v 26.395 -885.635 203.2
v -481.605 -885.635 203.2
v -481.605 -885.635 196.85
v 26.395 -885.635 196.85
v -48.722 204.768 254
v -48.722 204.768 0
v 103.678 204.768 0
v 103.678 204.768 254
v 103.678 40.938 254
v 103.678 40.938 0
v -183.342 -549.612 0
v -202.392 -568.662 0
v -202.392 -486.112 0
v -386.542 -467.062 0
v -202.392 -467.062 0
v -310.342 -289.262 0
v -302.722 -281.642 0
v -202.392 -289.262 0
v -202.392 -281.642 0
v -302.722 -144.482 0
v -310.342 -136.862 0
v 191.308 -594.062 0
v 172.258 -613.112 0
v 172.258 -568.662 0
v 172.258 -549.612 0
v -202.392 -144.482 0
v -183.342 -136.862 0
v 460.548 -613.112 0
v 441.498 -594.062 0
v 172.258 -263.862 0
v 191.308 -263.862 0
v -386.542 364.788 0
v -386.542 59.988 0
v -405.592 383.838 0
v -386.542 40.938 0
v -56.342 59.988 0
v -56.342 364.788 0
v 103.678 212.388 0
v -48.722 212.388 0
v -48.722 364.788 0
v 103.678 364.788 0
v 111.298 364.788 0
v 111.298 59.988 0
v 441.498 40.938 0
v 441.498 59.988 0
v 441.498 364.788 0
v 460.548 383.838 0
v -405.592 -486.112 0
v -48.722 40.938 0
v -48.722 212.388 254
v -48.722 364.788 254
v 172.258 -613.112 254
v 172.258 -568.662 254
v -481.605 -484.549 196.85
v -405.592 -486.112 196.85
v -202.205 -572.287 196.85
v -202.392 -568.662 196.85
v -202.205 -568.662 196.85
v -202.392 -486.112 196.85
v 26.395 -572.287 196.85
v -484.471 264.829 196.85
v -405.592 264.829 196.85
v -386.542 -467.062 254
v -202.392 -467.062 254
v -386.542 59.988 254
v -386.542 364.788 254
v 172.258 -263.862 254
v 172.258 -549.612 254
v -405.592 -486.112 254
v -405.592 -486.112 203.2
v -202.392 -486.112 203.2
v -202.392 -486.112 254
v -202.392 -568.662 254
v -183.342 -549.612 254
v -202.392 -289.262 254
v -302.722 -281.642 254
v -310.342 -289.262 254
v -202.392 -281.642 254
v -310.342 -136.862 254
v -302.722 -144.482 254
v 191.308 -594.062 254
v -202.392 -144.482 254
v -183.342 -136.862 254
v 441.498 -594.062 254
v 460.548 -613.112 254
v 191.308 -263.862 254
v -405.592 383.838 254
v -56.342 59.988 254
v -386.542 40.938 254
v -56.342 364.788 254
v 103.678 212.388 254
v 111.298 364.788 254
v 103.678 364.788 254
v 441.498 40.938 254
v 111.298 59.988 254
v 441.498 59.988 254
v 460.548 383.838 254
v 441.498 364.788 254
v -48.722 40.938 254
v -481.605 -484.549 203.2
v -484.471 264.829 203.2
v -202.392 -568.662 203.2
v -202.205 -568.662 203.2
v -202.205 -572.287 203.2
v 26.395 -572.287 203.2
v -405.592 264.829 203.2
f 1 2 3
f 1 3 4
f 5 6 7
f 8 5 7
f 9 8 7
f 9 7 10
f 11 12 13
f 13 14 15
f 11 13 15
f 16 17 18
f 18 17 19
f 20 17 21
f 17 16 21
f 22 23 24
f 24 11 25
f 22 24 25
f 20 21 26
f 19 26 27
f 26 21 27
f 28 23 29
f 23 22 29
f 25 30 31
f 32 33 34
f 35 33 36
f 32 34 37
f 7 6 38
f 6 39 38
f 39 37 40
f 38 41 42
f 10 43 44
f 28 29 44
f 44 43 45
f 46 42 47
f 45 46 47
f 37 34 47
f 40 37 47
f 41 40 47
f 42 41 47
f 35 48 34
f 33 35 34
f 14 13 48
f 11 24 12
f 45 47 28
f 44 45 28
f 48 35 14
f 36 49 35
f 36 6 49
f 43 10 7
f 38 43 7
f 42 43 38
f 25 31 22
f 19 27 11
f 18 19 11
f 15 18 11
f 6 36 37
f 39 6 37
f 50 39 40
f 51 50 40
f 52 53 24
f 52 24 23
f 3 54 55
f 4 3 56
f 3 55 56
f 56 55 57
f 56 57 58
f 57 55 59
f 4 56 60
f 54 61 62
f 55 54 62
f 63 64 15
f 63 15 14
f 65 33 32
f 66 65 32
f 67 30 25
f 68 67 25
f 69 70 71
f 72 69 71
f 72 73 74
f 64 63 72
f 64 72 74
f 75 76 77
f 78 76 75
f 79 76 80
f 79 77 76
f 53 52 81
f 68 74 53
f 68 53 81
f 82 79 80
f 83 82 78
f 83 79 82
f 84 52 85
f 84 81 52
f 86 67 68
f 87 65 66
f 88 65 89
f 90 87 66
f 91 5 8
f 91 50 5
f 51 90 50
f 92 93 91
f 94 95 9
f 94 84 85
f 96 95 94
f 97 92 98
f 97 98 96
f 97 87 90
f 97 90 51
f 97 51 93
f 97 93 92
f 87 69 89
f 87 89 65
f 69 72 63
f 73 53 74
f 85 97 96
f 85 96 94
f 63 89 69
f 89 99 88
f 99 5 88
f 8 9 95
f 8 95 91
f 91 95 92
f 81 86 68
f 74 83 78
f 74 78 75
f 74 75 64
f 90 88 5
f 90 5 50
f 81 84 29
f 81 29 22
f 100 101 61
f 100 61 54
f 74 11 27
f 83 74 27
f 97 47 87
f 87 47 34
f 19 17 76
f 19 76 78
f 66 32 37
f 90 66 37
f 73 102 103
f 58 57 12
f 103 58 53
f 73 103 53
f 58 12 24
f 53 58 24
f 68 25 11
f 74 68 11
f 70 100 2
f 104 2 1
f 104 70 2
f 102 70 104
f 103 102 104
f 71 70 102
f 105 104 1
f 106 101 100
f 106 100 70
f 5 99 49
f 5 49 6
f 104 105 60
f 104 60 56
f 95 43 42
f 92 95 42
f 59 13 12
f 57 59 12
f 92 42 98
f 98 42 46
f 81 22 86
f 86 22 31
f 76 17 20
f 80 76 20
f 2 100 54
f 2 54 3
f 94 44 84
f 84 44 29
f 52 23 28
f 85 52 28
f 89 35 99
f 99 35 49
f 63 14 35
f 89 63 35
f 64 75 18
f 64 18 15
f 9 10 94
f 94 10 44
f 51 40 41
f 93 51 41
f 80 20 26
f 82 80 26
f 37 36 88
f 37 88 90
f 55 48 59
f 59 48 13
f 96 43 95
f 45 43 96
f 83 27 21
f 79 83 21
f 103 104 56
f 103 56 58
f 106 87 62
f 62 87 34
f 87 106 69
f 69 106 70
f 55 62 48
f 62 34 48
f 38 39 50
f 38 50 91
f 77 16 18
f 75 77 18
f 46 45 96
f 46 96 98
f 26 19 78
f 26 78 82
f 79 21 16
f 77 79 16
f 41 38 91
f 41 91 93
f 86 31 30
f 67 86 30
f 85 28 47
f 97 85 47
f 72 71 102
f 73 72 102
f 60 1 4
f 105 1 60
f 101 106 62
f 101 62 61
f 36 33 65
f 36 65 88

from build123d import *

# Parameters (mm, degrees)
F0_W     = 100.33
F0_H     = 137.16
F0_W_2   = 330.2
F0_H_2   = 304.8
F0_W_3   = 152.4
F0_H_3   = 152.4
F1_DEPTH = 254
F4_DEPTH = 6.35
F6_DEPTH = 6.35


with BuildPart() as f1:
    # F0 (on Top) → F1 (new body)
    with BuildSketch(Plane.XY):
        Polygon((460.5475887705, 383.838060368), (-405.5924112295, 383.838060368), (-405.5924112295, 40.938060368), (-405.5924112295, -486.111939632), (-202.3924112295, -486.111939632), (-202.3924112295, -568.661939632), (26.2075887705, -568.661939632), (172.2575887705, -568.661939632), (172.2575887705, -613.111939632), (460.5475887705, -613.111939632), (460.5475887705, -282.911939632), align=None)
        with Locations((-252.5574112295, -213.061939632)):
            Rectangle(F0_W, F0_H, mode=Mode.SUBTRACT)
        with Locations((-221.4424112295, 212.388060368)):
            Rectangle(F0_W_2, F0_H_2, mode=Mode.SUBTRACT)
        Polygon((-386.5424112295, -467.061939632), (-386.5424112295, 40.938060368), (-48.7224112295, 40.938060368), (-48.7224112295, 204.768060368), (103.6775887705, 204.768060368), (103.6775887705, 40.938060368), (281.4775887705, 40.938060368), (289.0975887705, 40.938060368), (441.4975887705, 40.938060368), (441.4975887705, -86.061939632), (441.4975887705, -93.681939632), (441.4975887705, -263.861939632), (441.4975887705, -594.061939632), (191.3075887705, -594.061939632), (191.3075887705, -263.861939632), (172.2575887705, -263.861939632), (172.2575887705, -549.611939632), (-183.3424112295, -549.611939632), (-183.3424112295, -486.111939632), (-183.3424112295, -136.861939632), (-310.3424112295, -136.861939632), (-310.3424112295, -289.261939632), (-202.3924112295, -289.261939632), (-202.3924112295, -467.061939632), align=None, mode=Mode.SUBTRACT)
        with Locations((27.4775887705, 288.588060368)):
            Rectangle(F0_W_3, F0_H_3, mode=Mode.SUBTRACT)
        with Locations((276.3975887705, 212.388060368)):
            Rectangle(F0_W_2, F0_H_2, mode=Mode.SUBTRACT)
    extrude(amount=F1_DEPTH)

    # F3 (on offset) → F4 (join)
    with BuildSketch(Plane.XY.offset(203.2)):
        Polygon((-202.2046655178, -572.2870230675), (-202.2046655178, -484.5494627953), (-481.6046655178, -484.5494627953), (-481.6046655178, -885.6354951859), (26.3953344822, -885.6354951859), (26.3953344822, -572.2870230675), align=None)
    extrude(amount=-F4_DEPTH)

    # F5 (on face) → F6 (join)
    with BuildSketch(Plane.XY.offset(203.2)):
        Polygon((-484.4706356525, 264.8289501667), (-481.6046655178, -484.5494627953), (-405.5924112295, -484.5494627953), (-405.5924112295, -486.111939632), (-401.7352461815, 264.8289501667), align=None)
    extrude(amount=-F6_DEPTH)


solid = f1.part
